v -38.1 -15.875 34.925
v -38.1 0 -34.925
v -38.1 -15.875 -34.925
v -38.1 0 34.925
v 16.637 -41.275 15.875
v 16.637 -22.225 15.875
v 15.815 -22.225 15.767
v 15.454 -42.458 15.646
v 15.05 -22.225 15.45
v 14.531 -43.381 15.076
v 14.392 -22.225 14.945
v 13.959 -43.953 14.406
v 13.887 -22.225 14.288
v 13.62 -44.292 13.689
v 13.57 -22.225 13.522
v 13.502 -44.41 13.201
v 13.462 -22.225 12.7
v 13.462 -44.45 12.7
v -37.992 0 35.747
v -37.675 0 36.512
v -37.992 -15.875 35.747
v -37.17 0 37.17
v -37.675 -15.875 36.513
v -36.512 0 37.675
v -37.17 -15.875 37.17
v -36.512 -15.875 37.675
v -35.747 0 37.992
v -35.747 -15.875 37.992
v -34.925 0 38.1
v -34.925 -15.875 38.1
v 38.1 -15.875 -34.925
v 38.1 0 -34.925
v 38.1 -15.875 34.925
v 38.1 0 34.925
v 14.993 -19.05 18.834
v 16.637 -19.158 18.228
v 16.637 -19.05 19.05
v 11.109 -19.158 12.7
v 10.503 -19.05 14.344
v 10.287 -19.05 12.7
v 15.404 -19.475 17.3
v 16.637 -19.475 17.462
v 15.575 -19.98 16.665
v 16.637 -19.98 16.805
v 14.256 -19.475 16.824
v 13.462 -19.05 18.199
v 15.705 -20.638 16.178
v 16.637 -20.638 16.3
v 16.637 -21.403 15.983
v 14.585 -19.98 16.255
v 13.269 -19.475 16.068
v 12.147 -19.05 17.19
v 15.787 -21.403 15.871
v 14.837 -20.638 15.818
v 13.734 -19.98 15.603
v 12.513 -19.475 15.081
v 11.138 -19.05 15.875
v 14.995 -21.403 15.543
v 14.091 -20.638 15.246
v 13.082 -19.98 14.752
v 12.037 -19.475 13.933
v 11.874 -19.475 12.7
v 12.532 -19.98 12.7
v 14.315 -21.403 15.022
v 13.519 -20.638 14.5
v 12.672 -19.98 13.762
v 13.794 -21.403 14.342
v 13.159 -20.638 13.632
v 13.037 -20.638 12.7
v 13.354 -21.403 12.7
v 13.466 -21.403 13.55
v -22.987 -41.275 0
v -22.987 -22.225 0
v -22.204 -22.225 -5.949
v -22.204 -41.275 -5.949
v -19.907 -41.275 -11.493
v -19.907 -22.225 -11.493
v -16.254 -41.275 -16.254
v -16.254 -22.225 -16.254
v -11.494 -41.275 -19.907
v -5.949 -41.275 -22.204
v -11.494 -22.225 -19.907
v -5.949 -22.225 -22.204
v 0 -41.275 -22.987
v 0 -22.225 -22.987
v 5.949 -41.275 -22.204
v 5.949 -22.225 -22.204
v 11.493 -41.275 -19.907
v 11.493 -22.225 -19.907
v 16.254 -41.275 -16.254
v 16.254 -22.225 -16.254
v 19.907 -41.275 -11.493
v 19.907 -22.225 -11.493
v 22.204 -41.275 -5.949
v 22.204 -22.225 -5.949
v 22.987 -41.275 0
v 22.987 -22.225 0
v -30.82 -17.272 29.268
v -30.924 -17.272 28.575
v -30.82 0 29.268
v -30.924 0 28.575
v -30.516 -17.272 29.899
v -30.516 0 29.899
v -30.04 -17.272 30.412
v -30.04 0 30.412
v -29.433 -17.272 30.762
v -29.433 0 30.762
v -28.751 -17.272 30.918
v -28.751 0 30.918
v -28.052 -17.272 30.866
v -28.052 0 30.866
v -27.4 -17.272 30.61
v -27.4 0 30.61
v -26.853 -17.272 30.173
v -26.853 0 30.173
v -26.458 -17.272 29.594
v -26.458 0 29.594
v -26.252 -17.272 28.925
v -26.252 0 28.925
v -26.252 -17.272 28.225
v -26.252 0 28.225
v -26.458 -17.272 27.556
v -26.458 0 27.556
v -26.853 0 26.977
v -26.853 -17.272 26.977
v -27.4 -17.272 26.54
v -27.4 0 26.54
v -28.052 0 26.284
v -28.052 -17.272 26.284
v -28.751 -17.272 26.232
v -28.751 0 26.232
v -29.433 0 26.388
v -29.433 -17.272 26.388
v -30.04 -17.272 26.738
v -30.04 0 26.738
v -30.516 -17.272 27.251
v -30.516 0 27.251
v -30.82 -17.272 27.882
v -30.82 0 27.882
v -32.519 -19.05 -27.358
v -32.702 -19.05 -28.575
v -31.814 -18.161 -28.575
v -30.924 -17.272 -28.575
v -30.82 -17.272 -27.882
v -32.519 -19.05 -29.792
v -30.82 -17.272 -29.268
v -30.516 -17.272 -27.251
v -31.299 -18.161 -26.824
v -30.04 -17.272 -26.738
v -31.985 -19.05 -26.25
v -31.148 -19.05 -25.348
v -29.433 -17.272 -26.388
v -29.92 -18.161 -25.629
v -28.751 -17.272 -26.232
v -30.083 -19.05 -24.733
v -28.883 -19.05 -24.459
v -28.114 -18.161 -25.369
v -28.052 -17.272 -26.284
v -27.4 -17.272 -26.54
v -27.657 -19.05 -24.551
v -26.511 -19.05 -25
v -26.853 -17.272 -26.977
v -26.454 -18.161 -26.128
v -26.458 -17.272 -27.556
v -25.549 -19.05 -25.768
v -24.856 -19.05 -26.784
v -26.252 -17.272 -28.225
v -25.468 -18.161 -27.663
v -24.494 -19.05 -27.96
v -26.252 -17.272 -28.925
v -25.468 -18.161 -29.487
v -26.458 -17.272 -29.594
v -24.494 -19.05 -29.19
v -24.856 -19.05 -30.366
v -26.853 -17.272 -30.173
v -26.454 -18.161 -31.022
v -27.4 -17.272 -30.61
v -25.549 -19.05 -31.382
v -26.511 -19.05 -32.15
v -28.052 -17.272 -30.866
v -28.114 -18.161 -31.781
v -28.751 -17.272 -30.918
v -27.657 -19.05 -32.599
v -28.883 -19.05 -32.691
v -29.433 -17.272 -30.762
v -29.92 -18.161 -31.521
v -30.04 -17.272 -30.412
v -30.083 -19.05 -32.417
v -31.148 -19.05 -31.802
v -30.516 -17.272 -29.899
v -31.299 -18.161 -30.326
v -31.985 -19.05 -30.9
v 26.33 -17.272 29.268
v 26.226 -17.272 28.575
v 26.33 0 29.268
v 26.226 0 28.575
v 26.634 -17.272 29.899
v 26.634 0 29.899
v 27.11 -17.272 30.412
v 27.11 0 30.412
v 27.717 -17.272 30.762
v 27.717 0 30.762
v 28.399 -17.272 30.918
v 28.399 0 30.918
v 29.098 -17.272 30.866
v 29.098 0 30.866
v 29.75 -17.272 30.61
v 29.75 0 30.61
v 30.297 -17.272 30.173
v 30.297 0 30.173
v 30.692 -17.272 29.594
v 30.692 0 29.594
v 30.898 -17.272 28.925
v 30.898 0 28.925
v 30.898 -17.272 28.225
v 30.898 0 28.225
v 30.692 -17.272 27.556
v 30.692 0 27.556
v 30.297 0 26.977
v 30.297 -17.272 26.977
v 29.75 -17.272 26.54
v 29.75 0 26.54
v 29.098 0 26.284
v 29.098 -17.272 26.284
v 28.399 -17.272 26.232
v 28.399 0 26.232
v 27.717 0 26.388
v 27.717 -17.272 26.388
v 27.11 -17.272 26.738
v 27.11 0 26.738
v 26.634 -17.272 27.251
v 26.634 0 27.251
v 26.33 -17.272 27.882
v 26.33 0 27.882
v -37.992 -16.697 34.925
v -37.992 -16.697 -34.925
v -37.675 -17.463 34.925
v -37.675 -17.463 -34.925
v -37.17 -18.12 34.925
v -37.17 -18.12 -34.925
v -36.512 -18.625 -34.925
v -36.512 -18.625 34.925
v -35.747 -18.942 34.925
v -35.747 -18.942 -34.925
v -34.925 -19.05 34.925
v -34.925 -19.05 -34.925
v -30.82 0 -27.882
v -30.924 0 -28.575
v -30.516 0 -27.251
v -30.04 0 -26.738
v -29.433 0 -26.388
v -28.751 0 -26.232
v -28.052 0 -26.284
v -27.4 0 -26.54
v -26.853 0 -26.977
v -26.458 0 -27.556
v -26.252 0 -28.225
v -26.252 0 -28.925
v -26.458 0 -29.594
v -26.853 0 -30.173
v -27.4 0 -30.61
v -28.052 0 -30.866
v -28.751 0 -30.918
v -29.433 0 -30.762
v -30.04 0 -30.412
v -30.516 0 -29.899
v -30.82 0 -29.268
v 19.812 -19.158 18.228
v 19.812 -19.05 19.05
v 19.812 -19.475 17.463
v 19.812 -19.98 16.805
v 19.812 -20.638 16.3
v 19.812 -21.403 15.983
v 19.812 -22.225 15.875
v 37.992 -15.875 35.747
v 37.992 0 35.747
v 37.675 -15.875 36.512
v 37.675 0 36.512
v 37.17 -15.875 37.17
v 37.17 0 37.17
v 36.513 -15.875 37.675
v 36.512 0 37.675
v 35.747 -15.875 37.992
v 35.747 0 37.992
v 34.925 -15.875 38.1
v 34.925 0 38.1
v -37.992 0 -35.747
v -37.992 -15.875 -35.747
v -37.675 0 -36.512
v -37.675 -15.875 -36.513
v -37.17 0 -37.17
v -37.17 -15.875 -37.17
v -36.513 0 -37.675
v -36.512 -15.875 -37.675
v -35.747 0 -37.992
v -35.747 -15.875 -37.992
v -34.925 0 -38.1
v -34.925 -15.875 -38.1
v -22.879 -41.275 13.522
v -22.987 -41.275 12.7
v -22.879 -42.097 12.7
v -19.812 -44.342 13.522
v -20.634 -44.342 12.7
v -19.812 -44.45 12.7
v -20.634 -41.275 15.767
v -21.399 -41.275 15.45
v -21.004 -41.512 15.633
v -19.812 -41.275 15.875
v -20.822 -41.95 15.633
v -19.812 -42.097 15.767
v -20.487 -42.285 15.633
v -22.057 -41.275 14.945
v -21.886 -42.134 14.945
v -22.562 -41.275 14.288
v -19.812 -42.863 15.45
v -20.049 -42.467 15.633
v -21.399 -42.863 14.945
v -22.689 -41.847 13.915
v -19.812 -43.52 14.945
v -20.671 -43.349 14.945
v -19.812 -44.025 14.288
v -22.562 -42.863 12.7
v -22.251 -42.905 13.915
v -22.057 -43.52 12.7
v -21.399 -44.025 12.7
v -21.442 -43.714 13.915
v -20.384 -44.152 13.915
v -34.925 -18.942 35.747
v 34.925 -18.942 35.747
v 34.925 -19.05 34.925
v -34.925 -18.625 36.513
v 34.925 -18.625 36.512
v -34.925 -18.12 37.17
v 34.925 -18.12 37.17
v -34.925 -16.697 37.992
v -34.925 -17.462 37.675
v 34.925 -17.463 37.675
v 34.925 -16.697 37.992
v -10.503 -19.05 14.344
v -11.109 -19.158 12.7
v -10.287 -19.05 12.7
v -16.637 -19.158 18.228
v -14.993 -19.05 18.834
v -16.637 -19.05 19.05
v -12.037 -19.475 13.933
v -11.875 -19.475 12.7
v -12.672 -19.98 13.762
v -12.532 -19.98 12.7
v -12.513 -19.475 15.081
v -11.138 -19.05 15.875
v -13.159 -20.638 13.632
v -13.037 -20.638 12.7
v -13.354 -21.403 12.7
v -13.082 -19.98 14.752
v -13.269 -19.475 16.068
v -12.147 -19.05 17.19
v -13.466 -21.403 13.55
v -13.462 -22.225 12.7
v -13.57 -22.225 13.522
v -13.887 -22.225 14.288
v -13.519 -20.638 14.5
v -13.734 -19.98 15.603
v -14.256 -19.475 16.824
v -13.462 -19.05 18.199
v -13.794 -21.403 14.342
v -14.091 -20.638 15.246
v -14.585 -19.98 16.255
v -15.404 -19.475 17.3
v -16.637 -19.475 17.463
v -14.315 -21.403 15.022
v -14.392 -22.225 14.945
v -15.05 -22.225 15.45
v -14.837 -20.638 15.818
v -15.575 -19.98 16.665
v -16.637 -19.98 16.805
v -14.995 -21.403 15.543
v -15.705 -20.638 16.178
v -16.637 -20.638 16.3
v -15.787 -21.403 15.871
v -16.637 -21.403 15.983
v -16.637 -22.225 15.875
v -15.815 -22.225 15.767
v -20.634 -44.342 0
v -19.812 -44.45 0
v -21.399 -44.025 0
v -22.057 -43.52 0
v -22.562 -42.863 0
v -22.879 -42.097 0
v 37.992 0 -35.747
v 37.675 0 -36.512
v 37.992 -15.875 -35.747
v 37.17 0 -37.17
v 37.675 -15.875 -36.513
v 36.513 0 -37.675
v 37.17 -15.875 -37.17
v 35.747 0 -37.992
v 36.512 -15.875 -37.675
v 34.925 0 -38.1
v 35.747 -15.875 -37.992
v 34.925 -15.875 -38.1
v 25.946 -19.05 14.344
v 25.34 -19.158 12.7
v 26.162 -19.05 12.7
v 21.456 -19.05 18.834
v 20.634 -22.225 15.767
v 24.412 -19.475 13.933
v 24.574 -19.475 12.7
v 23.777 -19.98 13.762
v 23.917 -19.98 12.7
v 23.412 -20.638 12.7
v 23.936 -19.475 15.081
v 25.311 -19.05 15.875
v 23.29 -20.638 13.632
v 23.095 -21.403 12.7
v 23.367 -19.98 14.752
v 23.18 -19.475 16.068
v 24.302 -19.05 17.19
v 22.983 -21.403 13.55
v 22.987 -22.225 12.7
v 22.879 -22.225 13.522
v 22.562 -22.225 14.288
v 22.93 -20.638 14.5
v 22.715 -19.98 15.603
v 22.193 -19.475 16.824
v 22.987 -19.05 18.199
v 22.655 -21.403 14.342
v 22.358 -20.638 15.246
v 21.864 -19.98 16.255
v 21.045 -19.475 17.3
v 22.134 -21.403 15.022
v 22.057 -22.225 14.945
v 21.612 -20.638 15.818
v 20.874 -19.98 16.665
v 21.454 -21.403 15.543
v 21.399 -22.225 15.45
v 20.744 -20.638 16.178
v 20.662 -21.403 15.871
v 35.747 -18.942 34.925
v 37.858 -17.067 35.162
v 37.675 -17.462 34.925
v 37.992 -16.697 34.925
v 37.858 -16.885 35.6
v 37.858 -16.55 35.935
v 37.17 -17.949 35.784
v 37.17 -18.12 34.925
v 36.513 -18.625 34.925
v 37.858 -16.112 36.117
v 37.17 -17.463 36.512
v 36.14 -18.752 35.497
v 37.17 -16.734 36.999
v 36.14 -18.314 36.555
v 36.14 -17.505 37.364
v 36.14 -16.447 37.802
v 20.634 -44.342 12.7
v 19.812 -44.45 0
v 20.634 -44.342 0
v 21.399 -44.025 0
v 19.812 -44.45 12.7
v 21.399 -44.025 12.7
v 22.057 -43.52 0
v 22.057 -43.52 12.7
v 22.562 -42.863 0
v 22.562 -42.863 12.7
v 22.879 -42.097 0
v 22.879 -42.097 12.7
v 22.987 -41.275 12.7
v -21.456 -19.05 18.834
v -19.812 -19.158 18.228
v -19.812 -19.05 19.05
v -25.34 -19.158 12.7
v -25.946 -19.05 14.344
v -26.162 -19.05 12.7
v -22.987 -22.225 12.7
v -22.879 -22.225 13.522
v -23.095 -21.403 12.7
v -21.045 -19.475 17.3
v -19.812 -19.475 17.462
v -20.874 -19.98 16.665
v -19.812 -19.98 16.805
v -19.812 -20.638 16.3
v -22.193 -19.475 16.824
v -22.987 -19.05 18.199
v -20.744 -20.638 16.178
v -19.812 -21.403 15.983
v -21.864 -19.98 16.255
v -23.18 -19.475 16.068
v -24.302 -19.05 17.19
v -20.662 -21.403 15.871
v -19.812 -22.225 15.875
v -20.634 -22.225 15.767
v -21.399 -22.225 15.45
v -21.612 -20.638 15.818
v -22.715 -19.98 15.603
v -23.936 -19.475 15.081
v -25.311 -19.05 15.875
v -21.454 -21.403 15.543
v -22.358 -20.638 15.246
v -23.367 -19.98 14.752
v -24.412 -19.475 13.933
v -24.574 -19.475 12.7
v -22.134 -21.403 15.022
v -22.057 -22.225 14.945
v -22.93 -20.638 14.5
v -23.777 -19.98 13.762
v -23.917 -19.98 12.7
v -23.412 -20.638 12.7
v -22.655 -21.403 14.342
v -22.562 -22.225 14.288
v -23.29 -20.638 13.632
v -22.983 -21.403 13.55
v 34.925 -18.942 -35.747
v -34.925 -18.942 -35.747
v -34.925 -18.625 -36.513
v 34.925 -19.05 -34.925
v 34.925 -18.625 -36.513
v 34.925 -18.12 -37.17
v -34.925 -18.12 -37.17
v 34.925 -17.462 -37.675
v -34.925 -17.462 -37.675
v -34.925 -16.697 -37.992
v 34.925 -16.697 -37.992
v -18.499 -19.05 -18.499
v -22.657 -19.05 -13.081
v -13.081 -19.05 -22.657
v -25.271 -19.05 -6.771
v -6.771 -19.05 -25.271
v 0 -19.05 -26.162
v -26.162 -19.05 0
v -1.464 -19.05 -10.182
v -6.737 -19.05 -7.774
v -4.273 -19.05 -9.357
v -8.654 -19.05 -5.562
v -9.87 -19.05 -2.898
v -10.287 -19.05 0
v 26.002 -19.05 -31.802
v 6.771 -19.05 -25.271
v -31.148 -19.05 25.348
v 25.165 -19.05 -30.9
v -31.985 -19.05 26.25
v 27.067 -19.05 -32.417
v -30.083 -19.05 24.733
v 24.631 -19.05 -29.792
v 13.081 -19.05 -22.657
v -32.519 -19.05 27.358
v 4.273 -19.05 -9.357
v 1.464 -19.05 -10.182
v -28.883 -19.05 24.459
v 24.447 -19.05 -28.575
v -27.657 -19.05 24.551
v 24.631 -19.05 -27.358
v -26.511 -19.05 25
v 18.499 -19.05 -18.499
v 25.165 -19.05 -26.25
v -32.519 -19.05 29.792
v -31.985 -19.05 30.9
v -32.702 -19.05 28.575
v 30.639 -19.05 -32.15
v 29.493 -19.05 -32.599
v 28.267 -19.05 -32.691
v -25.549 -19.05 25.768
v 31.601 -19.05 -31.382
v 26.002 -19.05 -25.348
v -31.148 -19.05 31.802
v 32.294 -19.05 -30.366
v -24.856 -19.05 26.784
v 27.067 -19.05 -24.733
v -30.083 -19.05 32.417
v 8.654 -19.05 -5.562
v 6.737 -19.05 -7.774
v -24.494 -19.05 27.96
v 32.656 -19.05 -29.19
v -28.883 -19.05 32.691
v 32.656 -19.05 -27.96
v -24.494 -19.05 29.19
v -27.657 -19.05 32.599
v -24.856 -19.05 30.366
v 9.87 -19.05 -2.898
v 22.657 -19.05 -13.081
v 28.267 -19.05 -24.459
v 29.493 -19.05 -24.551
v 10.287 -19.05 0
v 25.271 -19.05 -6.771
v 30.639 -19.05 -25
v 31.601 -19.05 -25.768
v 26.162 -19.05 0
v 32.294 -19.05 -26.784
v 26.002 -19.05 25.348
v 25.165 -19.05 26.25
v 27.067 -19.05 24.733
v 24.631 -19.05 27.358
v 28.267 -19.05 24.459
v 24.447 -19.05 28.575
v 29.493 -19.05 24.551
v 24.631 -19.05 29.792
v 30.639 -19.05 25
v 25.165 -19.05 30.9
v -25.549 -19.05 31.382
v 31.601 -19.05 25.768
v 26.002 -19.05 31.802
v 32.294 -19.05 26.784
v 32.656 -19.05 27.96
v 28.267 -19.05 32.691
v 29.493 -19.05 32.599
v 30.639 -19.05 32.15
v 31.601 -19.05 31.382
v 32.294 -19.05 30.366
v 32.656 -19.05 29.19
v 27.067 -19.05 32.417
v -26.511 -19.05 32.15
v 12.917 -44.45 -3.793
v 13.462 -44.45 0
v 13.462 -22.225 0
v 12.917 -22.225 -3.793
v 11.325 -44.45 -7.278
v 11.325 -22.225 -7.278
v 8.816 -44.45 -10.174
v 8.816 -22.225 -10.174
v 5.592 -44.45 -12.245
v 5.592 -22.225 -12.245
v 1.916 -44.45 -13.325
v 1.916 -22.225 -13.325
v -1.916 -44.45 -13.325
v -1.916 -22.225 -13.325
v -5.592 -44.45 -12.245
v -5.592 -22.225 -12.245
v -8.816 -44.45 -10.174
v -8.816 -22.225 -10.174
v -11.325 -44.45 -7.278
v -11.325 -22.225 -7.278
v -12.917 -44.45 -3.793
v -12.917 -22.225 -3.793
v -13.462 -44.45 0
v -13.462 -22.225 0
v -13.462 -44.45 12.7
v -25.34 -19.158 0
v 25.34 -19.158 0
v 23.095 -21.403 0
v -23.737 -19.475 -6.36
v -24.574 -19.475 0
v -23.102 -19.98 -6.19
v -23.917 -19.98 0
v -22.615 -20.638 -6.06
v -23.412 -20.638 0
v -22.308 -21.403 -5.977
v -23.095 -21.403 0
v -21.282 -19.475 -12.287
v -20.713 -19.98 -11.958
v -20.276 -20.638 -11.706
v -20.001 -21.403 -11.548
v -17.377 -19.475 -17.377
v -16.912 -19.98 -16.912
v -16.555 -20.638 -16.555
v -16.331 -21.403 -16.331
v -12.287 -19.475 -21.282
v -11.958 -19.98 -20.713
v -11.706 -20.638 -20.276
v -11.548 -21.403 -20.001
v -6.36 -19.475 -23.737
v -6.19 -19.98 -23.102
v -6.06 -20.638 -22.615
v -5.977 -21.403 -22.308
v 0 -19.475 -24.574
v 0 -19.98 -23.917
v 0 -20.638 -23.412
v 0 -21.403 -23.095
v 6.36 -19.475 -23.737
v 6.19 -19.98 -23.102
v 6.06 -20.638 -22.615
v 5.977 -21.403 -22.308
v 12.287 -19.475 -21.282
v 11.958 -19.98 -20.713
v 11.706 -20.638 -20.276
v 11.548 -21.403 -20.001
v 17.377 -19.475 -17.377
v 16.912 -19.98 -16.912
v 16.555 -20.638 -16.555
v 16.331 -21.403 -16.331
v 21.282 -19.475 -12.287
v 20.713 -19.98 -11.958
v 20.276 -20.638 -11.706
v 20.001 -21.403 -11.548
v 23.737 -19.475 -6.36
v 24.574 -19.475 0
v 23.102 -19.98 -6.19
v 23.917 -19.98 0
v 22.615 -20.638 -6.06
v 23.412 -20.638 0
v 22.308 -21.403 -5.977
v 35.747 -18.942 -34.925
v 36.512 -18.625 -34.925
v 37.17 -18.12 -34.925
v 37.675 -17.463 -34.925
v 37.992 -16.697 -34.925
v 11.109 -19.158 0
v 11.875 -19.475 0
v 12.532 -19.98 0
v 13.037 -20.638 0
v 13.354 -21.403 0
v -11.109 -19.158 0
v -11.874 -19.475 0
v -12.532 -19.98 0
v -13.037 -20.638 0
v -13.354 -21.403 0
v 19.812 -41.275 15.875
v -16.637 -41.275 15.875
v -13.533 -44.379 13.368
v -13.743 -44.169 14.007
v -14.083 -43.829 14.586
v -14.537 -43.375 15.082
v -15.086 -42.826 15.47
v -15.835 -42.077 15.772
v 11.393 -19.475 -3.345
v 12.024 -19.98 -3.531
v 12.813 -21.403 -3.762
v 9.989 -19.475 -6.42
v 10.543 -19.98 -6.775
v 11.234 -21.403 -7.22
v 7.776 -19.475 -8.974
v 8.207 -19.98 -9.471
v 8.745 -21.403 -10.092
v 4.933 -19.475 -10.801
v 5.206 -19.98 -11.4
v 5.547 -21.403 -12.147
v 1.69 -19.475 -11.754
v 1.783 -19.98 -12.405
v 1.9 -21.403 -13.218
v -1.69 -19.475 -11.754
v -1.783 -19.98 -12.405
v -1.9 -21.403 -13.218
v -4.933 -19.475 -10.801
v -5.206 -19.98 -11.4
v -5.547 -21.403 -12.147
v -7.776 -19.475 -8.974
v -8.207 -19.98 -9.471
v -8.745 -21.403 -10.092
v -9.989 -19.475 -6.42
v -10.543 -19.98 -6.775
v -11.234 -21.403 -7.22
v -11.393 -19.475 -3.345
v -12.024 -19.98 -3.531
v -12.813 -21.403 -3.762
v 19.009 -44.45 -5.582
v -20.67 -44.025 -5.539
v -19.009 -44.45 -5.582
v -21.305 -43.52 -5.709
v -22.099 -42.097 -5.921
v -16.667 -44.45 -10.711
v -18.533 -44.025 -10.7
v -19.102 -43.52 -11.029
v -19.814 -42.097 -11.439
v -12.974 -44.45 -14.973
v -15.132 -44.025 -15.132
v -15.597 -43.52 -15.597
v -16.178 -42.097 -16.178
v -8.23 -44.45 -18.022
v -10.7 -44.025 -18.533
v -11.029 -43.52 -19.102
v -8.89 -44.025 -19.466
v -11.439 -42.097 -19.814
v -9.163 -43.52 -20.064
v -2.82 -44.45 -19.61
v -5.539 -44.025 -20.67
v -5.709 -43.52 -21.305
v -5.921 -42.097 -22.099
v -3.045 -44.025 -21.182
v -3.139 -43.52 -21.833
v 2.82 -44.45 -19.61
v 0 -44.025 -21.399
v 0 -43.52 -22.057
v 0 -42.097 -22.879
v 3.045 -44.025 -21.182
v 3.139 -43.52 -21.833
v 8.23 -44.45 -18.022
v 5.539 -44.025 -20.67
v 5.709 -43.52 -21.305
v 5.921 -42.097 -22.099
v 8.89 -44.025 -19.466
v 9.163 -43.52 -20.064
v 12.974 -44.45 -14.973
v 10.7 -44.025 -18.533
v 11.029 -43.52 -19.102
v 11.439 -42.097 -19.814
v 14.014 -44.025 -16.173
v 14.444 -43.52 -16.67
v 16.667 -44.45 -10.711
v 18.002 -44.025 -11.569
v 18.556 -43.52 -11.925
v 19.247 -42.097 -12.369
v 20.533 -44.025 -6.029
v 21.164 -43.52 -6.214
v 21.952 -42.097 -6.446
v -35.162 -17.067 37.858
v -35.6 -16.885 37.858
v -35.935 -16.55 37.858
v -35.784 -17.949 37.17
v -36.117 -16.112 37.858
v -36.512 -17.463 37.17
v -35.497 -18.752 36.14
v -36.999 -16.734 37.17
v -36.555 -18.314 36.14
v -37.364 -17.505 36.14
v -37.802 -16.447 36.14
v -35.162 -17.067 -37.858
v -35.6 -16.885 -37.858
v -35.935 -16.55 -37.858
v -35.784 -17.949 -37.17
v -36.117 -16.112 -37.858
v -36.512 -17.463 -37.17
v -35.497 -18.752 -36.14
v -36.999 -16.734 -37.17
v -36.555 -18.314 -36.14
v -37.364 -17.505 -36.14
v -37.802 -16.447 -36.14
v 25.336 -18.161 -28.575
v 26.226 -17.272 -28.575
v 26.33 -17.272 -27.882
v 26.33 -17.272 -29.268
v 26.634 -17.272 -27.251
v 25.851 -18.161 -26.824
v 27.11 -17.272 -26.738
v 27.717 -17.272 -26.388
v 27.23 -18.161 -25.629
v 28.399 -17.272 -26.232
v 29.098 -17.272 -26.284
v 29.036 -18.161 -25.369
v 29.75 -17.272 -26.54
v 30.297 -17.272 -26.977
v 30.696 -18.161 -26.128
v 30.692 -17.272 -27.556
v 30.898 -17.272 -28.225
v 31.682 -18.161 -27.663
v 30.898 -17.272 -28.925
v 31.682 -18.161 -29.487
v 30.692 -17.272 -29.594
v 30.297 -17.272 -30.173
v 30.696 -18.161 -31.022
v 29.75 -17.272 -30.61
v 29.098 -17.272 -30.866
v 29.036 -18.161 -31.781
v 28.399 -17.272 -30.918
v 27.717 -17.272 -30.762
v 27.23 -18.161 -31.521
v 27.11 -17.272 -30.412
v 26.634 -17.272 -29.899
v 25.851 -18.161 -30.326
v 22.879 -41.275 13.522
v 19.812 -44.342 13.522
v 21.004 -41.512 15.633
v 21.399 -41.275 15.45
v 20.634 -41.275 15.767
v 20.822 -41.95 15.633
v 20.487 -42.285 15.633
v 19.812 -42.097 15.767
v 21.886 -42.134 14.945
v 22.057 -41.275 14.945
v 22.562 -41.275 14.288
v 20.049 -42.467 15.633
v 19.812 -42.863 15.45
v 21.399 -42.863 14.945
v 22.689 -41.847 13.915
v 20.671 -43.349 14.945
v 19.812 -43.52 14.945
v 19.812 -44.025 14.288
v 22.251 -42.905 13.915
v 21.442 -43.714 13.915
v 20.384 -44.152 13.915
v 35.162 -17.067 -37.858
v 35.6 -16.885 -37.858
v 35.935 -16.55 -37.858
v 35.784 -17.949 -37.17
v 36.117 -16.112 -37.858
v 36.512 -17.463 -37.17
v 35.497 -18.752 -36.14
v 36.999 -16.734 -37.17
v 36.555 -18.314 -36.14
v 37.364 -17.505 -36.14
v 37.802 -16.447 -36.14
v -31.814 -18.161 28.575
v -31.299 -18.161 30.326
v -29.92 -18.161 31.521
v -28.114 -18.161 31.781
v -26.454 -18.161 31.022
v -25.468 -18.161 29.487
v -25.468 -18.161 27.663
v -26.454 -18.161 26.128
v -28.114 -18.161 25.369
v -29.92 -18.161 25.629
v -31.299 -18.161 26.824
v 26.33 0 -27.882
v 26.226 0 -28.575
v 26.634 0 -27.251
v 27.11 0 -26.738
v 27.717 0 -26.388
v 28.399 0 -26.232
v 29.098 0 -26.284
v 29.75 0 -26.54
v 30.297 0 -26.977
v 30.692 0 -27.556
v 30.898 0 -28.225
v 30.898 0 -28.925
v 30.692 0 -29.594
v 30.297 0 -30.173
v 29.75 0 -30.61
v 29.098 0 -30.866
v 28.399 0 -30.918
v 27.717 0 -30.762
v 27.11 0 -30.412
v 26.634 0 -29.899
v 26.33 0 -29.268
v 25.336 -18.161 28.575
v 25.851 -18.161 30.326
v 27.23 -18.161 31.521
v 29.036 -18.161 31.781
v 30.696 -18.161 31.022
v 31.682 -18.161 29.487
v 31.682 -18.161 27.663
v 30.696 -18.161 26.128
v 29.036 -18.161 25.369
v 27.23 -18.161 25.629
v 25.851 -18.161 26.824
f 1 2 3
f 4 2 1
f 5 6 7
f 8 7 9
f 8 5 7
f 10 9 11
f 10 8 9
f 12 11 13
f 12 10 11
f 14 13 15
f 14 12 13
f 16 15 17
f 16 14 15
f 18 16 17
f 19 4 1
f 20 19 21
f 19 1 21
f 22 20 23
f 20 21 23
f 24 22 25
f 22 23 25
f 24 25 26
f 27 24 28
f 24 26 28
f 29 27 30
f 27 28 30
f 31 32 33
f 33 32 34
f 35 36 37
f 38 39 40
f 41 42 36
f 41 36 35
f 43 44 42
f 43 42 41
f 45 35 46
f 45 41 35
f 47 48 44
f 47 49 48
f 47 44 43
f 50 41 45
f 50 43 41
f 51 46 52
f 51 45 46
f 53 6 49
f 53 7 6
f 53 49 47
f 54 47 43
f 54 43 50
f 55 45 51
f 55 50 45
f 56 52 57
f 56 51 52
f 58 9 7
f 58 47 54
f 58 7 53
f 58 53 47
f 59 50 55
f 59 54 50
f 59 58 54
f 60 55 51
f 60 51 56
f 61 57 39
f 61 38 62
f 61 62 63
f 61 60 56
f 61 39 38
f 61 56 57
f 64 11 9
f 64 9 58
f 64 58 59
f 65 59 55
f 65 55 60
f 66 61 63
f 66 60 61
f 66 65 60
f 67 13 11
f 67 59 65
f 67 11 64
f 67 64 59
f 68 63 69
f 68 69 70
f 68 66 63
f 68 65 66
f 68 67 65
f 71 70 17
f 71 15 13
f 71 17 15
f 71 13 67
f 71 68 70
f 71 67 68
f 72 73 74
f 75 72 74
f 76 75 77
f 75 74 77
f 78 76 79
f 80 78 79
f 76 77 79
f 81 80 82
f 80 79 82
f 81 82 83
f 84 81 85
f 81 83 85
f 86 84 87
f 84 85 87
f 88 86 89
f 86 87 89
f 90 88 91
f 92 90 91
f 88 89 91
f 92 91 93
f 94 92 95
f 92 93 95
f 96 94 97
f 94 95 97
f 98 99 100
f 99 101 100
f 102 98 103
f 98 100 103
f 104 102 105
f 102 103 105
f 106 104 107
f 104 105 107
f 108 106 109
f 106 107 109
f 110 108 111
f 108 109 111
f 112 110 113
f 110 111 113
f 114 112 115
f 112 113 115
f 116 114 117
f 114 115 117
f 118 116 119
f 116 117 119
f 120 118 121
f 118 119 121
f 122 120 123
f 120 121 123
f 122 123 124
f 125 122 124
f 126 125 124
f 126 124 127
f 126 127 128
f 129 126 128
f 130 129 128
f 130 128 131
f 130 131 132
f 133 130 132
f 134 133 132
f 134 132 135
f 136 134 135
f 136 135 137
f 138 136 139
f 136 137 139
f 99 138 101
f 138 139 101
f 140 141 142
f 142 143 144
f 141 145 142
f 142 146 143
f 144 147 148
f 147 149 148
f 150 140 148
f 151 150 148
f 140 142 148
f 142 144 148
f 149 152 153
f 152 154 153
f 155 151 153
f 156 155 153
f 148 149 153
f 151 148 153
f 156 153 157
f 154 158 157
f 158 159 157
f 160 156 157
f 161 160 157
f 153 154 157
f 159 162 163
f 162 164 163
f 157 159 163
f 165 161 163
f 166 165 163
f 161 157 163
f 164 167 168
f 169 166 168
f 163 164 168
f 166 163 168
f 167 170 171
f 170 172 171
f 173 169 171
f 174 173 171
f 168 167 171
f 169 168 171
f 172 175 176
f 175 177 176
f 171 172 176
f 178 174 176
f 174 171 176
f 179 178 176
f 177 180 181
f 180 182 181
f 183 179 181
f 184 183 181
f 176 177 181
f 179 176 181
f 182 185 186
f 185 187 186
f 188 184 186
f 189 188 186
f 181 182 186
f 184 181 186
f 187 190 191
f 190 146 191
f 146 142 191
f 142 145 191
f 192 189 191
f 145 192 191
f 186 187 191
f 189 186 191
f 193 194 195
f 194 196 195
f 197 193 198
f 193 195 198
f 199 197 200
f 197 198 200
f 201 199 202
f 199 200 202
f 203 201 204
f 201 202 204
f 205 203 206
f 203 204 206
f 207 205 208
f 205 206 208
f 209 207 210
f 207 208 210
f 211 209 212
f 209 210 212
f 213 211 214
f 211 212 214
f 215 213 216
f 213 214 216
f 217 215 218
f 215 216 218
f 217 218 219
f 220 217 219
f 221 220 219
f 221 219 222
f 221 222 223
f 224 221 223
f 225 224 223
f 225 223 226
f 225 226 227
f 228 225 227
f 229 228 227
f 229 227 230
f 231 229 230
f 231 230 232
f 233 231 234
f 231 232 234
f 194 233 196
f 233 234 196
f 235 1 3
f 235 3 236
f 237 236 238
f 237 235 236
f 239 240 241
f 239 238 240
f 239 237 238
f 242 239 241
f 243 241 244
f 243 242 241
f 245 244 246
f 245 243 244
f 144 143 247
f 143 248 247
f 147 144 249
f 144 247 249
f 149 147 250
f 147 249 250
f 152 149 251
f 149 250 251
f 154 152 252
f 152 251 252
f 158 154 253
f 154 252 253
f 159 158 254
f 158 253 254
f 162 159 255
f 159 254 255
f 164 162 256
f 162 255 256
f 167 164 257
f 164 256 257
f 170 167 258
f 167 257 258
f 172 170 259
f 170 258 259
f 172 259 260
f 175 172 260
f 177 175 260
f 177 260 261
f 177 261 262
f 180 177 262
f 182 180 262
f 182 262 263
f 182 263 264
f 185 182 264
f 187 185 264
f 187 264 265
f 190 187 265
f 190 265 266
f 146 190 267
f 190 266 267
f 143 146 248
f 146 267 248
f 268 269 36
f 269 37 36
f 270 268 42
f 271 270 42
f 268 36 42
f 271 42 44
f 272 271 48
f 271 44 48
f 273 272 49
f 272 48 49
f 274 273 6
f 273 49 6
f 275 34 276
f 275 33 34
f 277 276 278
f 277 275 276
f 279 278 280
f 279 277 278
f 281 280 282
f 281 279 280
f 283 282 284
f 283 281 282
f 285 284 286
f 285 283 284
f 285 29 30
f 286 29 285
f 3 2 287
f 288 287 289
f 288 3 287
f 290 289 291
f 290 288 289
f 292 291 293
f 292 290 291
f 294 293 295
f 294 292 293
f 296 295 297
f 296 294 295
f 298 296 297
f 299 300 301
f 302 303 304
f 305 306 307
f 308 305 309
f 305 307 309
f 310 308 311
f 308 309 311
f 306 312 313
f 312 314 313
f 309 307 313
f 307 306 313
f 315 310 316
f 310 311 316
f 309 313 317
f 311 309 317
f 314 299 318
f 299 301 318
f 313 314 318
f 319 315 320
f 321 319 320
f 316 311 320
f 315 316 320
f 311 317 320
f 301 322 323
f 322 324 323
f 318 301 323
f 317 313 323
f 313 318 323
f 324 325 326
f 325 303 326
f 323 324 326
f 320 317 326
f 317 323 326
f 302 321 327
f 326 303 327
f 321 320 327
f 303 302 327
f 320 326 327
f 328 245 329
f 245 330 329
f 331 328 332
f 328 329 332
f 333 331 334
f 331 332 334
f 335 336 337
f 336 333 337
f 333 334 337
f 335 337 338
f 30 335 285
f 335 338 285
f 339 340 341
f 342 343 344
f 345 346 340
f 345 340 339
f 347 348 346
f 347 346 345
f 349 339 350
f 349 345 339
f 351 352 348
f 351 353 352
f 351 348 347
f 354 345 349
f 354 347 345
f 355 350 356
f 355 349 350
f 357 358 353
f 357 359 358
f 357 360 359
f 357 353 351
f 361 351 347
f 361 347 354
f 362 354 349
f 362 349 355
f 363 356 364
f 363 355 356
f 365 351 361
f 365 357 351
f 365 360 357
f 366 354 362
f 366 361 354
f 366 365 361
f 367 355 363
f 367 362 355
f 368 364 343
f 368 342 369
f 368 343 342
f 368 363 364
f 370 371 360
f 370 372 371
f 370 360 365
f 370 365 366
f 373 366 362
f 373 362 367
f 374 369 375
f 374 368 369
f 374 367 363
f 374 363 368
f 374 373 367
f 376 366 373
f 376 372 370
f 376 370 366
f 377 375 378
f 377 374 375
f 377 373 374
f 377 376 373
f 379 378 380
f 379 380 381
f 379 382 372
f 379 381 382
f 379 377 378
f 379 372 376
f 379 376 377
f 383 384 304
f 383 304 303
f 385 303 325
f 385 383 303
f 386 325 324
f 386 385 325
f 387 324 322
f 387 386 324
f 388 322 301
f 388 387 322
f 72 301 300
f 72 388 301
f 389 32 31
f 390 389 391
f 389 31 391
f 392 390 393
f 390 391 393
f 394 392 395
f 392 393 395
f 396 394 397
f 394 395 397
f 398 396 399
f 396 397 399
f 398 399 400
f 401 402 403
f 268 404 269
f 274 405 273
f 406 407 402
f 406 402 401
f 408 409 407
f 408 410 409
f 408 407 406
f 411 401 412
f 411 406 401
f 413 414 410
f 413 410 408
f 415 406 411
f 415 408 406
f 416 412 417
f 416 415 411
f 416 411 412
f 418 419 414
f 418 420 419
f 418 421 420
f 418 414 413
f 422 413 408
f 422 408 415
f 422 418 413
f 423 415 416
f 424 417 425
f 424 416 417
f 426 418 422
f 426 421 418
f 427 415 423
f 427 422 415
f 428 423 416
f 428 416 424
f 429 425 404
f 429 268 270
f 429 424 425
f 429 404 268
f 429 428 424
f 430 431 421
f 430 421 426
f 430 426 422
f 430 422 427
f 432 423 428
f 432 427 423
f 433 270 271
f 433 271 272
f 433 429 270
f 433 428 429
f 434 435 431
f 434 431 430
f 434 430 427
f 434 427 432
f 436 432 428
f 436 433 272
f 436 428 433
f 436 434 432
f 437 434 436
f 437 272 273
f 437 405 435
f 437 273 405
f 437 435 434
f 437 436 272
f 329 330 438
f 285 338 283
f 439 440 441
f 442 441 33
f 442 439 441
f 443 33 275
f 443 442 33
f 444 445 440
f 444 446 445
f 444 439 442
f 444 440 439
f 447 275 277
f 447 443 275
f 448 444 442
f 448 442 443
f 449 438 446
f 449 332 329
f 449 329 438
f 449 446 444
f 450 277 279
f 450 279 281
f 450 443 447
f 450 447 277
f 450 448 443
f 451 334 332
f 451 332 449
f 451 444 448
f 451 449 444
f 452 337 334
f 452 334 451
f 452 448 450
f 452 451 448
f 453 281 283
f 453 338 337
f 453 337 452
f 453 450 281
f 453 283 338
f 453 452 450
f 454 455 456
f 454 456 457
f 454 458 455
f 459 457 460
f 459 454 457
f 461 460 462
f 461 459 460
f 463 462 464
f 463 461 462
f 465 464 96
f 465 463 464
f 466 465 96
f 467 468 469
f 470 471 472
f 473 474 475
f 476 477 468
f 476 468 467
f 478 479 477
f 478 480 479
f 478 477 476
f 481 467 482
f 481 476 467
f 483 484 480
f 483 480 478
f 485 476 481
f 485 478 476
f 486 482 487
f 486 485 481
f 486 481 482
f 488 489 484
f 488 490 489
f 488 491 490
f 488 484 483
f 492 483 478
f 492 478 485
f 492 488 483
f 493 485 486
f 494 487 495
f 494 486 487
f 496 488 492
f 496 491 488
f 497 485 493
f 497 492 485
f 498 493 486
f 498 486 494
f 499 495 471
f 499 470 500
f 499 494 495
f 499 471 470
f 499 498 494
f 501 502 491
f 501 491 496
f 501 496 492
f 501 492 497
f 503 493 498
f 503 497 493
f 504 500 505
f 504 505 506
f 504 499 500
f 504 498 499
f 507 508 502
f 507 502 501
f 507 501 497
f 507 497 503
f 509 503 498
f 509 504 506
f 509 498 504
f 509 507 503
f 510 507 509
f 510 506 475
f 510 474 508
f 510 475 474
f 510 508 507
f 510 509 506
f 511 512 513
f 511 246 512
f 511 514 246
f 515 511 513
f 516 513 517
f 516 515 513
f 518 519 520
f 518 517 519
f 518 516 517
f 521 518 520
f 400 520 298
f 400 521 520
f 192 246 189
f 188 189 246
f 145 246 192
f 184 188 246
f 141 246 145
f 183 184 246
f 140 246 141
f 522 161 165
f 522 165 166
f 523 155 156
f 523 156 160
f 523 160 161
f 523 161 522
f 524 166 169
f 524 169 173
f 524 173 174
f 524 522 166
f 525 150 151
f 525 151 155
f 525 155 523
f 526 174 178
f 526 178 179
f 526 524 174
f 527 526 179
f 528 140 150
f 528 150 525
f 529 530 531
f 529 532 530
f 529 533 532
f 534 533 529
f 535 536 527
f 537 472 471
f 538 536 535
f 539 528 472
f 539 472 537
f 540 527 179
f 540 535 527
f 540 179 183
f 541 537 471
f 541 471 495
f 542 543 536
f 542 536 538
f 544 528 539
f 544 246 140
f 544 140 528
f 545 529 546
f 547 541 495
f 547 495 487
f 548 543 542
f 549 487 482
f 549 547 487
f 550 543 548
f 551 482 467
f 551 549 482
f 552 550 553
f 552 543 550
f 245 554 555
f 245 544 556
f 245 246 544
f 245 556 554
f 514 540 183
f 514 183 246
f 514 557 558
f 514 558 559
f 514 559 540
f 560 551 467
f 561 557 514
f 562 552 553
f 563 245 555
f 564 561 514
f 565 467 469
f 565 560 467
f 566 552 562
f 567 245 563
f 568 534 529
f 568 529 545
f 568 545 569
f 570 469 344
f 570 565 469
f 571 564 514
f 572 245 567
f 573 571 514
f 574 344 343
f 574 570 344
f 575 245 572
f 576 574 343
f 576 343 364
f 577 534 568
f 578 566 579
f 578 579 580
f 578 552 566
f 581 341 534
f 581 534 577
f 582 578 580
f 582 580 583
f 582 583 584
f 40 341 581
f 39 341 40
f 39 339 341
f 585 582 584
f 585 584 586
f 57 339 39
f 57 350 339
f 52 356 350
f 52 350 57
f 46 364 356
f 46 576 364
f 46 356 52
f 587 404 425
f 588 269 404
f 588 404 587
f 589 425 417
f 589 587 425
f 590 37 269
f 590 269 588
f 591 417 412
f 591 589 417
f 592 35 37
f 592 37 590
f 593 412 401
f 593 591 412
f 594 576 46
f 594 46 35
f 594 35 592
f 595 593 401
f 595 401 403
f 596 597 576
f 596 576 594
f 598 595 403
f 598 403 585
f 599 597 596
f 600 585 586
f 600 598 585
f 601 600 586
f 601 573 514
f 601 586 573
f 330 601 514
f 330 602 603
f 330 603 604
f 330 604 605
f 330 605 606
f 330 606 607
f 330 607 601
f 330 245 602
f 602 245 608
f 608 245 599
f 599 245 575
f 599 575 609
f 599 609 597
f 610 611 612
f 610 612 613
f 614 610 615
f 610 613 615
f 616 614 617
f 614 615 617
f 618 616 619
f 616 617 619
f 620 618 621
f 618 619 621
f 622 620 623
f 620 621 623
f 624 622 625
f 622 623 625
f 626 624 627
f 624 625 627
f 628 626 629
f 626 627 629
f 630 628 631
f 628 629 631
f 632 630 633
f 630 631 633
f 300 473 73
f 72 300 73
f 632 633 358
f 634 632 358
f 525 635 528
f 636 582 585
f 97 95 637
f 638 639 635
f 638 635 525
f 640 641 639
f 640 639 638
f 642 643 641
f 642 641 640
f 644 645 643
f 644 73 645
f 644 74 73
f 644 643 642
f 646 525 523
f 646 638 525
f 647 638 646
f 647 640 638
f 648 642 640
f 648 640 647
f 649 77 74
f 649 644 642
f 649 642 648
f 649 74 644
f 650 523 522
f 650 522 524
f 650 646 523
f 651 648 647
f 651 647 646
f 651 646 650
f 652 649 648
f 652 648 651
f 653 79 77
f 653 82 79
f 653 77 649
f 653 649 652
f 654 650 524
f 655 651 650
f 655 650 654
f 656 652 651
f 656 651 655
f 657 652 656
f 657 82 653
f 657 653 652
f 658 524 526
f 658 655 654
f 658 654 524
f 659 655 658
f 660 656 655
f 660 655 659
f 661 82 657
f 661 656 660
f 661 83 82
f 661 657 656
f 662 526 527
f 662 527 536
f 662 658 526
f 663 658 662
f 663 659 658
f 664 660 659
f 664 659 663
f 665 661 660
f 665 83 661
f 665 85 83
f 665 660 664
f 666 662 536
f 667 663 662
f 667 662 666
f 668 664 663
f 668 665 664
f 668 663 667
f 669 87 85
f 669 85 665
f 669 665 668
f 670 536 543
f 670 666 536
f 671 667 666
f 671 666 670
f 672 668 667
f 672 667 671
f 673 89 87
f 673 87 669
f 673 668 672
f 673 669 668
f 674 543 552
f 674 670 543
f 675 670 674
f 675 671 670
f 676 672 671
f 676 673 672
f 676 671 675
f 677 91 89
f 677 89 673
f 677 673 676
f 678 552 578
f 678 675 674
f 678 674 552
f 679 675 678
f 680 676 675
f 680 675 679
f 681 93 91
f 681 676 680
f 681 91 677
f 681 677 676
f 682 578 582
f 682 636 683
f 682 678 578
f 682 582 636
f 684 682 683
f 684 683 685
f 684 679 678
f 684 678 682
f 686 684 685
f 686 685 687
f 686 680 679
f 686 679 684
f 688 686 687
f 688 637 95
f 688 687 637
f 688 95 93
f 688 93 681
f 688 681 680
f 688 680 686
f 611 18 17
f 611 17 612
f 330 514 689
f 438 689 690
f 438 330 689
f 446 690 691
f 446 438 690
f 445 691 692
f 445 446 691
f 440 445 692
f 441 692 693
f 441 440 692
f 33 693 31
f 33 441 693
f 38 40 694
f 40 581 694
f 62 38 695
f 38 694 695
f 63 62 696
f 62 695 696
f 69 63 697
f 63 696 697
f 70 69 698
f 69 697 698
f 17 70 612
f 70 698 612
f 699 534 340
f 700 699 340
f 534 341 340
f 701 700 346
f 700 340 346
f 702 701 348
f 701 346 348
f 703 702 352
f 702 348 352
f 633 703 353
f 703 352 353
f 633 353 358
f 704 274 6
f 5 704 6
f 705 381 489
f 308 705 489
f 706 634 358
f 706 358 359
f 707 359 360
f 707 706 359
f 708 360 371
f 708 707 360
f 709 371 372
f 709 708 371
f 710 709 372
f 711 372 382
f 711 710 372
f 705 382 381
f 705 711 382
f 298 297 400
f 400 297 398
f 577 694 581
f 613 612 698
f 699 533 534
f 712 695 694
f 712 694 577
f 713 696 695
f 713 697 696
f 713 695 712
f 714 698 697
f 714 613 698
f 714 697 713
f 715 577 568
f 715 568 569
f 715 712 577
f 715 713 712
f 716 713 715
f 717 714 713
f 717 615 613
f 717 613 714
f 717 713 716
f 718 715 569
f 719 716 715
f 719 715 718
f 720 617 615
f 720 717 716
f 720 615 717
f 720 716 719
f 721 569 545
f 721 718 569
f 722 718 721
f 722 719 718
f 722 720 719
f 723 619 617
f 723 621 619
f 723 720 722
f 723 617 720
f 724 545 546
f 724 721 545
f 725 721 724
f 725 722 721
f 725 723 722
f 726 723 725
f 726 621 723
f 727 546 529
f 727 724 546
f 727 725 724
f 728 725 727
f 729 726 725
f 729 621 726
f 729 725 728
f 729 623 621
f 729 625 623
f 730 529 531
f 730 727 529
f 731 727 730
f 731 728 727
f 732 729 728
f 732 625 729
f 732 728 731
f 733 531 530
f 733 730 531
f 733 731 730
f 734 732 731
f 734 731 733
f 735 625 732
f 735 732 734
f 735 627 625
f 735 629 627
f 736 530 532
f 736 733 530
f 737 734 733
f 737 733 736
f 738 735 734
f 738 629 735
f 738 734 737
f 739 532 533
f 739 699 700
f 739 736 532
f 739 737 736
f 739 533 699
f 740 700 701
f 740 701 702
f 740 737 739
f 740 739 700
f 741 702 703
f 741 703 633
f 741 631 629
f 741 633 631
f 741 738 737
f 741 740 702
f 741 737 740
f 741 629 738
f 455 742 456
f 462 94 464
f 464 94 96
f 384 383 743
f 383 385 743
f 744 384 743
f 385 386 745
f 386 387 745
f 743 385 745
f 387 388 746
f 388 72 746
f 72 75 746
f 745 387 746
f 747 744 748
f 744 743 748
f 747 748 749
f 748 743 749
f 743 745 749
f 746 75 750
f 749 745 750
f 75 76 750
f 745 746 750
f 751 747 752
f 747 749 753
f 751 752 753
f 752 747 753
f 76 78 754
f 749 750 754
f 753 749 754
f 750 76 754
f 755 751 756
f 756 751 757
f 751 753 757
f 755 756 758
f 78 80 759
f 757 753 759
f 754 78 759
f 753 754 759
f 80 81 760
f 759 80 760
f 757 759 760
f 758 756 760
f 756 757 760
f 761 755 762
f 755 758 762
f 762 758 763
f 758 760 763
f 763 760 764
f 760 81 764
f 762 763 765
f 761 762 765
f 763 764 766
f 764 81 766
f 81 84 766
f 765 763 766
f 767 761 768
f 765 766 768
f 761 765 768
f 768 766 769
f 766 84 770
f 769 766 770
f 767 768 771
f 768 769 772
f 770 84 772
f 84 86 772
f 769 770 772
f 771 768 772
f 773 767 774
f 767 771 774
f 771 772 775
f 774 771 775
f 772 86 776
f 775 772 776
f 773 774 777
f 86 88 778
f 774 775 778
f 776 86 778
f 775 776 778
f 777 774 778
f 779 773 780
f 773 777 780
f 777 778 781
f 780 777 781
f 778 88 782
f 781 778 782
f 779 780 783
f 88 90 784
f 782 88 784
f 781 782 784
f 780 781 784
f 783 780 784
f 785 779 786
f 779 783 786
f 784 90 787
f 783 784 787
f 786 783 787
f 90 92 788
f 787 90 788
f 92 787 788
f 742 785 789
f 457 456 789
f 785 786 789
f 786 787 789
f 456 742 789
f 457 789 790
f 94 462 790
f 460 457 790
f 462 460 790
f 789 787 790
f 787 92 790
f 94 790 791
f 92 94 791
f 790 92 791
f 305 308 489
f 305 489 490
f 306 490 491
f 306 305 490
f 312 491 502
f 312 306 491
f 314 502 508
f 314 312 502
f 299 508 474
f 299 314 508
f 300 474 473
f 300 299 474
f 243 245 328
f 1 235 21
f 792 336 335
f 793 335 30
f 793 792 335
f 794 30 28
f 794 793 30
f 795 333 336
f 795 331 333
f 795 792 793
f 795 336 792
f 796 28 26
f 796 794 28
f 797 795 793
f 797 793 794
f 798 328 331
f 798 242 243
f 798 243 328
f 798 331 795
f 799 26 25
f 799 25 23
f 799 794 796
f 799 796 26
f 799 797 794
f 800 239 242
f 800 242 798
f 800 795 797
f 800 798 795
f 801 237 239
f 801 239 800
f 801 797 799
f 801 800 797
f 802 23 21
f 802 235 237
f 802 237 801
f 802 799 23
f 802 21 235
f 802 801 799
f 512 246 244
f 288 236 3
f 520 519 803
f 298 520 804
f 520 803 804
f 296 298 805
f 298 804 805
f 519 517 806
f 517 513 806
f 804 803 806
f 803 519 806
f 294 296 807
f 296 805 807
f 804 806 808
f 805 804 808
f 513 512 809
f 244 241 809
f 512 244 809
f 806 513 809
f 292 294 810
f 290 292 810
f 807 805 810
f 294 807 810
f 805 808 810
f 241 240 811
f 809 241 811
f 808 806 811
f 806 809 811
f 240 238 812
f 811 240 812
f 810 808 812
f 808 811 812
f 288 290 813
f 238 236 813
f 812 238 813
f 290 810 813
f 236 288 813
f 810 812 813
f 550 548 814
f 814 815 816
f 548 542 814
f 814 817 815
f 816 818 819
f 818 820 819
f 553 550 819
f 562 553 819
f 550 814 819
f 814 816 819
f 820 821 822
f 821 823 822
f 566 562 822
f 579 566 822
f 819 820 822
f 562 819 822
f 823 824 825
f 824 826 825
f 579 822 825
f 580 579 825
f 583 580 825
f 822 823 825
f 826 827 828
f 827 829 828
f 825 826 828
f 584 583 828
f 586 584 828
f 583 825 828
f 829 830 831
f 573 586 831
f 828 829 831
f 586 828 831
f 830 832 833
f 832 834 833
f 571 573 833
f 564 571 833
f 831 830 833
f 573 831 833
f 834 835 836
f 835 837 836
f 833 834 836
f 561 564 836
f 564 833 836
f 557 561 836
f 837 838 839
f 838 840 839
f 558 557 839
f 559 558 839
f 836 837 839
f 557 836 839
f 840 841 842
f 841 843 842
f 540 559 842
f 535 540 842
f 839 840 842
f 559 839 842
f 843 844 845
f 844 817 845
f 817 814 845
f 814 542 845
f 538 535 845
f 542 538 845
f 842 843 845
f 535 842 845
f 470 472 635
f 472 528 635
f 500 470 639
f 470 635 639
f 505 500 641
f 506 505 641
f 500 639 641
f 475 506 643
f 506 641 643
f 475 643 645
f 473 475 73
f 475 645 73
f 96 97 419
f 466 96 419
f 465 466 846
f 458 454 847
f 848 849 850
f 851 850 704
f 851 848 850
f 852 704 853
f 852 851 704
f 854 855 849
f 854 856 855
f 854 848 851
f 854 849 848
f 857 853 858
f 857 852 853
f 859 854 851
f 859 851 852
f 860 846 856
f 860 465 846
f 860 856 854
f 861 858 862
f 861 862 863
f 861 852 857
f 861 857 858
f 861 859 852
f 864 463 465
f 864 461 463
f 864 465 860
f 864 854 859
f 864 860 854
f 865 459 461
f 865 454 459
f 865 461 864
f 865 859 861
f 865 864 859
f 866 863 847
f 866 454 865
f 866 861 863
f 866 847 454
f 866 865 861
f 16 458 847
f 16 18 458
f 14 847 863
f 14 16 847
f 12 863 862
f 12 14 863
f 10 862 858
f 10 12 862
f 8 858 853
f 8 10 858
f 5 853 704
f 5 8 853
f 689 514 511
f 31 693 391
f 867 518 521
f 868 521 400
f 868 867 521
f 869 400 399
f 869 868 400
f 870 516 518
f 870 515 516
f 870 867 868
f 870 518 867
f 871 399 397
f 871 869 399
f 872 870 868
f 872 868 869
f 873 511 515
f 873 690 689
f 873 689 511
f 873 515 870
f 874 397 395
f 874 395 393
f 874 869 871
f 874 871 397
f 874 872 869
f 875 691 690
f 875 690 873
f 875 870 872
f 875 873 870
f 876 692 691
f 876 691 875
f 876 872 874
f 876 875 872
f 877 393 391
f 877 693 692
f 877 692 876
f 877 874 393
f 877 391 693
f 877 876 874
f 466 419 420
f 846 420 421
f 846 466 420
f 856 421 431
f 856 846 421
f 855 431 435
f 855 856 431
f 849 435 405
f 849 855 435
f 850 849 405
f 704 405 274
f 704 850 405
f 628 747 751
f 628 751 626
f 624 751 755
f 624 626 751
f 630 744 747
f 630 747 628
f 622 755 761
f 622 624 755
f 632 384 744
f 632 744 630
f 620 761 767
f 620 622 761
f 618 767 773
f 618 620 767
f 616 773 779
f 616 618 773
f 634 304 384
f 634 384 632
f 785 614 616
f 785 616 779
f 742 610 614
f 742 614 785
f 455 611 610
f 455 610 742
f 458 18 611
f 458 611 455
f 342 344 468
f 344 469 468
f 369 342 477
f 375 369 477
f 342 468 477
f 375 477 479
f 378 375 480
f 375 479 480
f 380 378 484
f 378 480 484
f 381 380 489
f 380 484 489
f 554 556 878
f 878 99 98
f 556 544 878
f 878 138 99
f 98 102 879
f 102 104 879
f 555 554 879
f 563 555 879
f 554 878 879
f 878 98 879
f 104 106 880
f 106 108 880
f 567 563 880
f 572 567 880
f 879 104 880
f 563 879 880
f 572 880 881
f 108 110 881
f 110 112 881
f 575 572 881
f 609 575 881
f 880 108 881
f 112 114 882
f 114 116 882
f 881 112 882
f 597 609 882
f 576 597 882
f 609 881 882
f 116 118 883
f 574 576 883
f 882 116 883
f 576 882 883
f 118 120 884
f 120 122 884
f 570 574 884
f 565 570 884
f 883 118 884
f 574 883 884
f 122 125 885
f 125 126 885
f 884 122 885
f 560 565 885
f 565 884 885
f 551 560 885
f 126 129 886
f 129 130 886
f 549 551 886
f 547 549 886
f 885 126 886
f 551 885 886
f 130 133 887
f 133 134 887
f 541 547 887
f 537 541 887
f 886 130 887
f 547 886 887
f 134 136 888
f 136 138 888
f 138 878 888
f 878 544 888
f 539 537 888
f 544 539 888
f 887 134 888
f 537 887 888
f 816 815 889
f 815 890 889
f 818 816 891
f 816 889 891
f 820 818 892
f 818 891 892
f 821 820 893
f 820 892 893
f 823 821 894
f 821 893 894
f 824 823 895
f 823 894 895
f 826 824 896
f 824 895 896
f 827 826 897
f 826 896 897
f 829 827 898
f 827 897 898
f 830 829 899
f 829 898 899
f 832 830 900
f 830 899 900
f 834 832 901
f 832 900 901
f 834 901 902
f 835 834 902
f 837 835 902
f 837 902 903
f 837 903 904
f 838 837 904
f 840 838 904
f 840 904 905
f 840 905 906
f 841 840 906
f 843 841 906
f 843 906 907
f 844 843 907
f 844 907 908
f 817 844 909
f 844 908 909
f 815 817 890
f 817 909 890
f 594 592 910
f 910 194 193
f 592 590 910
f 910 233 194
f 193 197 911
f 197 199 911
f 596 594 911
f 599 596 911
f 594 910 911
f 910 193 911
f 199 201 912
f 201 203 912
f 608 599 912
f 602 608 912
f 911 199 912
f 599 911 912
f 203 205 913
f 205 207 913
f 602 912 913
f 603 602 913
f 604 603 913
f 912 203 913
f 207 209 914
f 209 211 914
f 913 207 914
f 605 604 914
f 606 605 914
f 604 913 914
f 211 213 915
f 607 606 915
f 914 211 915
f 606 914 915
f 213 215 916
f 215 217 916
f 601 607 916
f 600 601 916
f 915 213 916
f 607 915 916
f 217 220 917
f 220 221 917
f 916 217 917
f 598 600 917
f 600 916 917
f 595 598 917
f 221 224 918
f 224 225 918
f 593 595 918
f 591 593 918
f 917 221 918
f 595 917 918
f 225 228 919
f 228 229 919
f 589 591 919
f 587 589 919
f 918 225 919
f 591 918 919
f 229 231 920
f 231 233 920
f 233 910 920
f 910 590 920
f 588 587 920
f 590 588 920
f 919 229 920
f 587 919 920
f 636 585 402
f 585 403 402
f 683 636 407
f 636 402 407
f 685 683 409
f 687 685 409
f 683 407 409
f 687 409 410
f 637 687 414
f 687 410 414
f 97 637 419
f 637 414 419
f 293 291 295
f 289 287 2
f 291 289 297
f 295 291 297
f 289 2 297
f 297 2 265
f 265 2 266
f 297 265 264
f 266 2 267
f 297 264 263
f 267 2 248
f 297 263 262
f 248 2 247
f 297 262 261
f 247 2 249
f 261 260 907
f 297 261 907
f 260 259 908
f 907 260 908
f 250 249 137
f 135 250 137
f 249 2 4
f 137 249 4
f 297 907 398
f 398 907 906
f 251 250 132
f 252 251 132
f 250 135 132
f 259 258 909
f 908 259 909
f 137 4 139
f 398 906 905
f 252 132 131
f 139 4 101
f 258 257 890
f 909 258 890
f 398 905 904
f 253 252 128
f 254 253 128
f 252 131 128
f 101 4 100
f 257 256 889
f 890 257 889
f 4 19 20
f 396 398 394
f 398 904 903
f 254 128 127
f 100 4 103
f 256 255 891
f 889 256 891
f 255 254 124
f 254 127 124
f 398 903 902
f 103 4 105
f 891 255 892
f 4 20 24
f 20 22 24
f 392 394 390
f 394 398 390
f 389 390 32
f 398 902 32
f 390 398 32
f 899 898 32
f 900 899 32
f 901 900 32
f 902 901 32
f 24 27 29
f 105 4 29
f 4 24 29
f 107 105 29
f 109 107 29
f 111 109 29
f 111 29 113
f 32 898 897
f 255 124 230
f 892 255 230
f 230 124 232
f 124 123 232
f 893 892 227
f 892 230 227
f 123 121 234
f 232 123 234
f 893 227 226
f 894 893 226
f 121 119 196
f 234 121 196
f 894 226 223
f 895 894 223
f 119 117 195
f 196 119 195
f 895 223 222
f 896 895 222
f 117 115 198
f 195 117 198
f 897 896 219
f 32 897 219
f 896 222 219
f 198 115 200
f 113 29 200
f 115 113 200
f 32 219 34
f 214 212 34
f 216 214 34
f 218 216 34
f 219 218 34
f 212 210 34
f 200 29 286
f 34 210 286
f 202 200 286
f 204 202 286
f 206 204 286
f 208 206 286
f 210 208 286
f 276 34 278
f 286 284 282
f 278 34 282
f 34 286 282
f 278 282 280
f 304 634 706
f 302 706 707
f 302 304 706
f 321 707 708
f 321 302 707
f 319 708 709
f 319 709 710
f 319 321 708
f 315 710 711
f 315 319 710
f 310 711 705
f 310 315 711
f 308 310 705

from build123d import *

# Parameters (mm, degrees)
F0_W           = 76.2
F0_H           = 76.2
F1_DEPTH       = 19.05
F3_DEPTH       = 25.4
F5_D           = 4.699
F5_CSINK_D     = 8.255
F5_CSINK_ANGLE = 90
F6_F1_R        = 3.175
F6_F2_R        = 3.175


with BuildPart() as f1:
    # F0 (on Front) → F1 (new body)
    with BuildSketch(Plane.XZ):
        Rectangle(F0_W, F0_H)
    extrude(amount=F1_DEPTH)

    # F2 (on face) → F3 (join)
    with BuildSketch(Plane.XZ.offset(19.05)):
        with BuildLine():
            ThreePointArc((13.462, 0), (0, -13.462), (-13.462, 0))
            Line((-13.462, 0), (-13.462, 15.875))
            Line((-13.462, 15.875), (-22.987, 15.875))
            Line((-22.987, 15.875), (-22.987, 0))
            ThreePointArc((-22.987, 0), (0, -22.987), (22.987, 0))
            Line((22.987, 0), (22.987, 15.875))
            Line((22.987, 15.875), (13.462, 15.875))
            Line((13.462, 15.875), (13.462, 0))
        make_face()
    extrude(amount=F3_DEPTH)

    # F5 (through all)
    with Locations(Plane.XZ.offset(19.05)):
        with Locations((-28.575, 28.575), (28.575, 28.575), (28.575, -28.575), (-28.575, -28.575)):
            CounterSinkHole(F5_D / 2, F5_CSINK_D / 2, counter_sink_angle=F5_CSINK_ANGLE)

    # F6: fillet of radius 3.175 on 23 edges, made by hand

    # F6_f1
    f6_f1_edges = [f1.edges().sort_by_distance(p)[0] for p in [
        (-38.1, -19.05, 0),
        (0, -19.05, 38.1),
        (38.1, -19.05, 0),
        (0, -19.05, -38.1),
        (0, -44.45, -22.987),
        (38.1, -9.525, -38.1),
        (38.1, -9.525, 38.1),
        (-38.1, -9.525, 38.1),
        (-38.1, -9.525, -38.1),
        (-13.462, -31.75, 15.875),
        (13.462, -31.75, 15.875),
        (22.987, -31.75, 15.875),
        (-22.987, -31.75, 15.875),
        (-18.2245, -44.45, 15.875),
        (18.2245, -44.45, 15.875),
        (22.987, -44.45, 7.9375),
        (-22.987, -44.45, 7.9375),
    ]]
    fillet(f6_f1_edges, radius=F6_F1_R)

    # F6_f2
    f6_f2_edges = [f1.edges().sort_by_distance(p)[0] for p in [
        (0, -19.05, -22.987),
        (0, -19.05, -13.462),
        (13.462, -19.05, 6.35),
        (-13.462, -19.05, 6.35),
        (22.987, -19.05, 6.35),
        (-22.987, -19.05, 6.35),
        (-22.0570640303, -19.05, 14.9450640303),
        (22.0570640303, -19.05, 14.9450640303),
        (-14.3919359697, -19.05, 14.9450640303),
        (14.3919359697, -19.05, 14.9450640303),
    ]]
    fillet(f6_f2_edges, radius=F6_F2_R)


solid = f1.part
